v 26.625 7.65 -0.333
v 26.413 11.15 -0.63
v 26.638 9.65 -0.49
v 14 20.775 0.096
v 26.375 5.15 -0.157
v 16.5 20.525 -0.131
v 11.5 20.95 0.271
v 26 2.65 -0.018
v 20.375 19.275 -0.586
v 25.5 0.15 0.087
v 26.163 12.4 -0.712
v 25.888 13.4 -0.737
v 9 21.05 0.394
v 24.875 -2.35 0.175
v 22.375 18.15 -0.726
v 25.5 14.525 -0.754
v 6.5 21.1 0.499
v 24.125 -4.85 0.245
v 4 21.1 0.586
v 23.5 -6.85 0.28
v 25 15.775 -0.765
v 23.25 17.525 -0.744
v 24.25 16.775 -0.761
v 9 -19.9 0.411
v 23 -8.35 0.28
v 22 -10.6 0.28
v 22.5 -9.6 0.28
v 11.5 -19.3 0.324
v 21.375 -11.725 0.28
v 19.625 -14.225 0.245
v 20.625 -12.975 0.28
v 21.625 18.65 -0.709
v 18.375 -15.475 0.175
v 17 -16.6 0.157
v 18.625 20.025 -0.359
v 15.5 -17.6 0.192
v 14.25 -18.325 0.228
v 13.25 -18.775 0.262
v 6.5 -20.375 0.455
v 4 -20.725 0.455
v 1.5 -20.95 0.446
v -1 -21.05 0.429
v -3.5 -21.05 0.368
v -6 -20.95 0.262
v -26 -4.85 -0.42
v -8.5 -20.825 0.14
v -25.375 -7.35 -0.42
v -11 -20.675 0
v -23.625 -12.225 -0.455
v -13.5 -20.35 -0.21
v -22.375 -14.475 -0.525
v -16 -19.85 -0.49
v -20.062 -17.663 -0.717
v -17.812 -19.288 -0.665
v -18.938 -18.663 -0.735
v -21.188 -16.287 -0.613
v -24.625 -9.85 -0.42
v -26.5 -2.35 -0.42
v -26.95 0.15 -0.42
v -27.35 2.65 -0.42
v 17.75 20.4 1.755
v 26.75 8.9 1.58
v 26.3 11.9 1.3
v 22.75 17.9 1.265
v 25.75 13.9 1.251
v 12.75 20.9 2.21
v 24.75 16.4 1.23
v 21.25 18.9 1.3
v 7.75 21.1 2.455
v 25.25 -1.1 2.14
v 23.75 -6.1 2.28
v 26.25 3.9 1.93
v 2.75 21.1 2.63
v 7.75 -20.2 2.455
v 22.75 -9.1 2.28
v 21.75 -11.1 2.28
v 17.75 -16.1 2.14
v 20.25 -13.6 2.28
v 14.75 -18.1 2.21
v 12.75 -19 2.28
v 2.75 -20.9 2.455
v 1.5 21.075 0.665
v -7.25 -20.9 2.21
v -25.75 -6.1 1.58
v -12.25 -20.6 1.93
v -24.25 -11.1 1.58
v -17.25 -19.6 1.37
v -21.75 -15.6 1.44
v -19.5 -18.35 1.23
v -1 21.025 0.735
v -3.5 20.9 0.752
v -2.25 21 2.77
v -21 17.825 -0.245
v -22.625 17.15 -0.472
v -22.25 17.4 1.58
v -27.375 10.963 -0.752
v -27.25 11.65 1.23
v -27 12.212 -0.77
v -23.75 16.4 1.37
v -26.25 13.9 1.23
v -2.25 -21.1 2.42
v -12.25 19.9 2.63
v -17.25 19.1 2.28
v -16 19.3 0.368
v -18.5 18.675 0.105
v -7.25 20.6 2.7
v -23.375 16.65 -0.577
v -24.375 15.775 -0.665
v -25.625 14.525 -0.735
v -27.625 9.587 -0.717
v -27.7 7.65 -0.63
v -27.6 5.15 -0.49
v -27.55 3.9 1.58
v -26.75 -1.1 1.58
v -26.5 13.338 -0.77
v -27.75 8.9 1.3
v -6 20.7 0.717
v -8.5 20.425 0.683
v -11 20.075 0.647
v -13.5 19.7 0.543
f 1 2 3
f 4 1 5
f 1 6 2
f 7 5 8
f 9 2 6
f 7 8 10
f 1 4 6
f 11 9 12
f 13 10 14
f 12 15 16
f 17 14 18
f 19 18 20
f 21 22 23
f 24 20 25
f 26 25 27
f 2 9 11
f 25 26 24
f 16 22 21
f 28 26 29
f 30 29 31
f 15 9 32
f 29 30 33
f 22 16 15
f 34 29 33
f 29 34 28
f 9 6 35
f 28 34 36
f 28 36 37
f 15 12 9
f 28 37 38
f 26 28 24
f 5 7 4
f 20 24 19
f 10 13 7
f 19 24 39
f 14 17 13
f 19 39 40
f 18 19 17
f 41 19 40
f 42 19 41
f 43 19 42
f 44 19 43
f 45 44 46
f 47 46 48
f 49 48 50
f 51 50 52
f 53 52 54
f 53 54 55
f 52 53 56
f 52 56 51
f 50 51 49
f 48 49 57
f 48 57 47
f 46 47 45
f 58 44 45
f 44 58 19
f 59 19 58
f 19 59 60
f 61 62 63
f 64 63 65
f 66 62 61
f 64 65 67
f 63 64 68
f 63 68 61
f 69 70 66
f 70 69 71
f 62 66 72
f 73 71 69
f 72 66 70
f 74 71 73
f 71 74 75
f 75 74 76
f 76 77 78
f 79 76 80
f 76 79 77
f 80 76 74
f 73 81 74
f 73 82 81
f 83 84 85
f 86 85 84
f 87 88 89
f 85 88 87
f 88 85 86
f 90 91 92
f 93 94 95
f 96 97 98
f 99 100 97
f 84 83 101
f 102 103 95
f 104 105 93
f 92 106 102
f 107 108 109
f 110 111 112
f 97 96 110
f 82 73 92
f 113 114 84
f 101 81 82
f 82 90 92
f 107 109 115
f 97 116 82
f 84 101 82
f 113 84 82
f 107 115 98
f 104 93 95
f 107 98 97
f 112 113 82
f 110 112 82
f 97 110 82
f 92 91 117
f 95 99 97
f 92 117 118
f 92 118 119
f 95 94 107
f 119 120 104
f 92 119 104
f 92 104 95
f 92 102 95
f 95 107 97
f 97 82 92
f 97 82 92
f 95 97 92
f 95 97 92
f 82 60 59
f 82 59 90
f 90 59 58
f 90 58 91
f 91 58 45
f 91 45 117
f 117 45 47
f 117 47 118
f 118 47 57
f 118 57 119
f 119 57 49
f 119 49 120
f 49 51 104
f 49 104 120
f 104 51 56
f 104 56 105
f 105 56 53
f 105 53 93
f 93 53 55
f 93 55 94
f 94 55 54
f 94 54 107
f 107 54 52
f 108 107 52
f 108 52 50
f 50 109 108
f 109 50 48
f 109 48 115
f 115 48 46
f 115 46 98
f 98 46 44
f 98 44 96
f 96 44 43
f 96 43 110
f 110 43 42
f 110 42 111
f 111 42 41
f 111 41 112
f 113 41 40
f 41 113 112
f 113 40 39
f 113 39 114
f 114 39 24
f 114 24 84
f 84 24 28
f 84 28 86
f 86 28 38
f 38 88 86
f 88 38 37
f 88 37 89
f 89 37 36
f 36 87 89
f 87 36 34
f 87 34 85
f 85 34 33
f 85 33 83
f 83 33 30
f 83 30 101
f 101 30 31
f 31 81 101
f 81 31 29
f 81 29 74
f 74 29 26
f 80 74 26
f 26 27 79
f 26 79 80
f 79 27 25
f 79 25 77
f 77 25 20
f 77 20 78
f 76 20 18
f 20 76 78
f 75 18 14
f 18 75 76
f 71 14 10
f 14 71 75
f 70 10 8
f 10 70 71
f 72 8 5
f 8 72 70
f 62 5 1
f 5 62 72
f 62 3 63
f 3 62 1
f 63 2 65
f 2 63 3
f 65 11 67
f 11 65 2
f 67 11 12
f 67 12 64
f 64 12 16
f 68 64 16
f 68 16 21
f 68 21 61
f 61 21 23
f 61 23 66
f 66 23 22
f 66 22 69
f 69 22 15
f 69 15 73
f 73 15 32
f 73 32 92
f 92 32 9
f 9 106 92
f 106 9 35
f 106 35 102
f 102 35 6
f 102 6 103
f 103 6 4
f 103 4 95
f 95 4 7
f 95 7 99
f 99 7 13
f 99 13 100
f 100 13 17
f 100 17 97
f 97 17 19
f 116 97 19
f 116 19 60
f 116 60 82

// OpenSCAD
$fs=2.100000;
polyhedron(points=[
        [-27.350000, 2.650002, -0.420000],
        [-26.950000, 0.149998, -0.420000],
        [-26.500000, -2.349998, -0.420000],
        [-26.000000, -4.850002, -0.420000],
        [-25.375001, -7.349998, -0.420000],
        [-24.624999, -9.850002, -0.420000],
        [-23.625001, -12.224998, -0.455000],
        [-22.374999, -14.475002, -0.525000],
        [-21.187501, -16.287499, -0.612500],
        [-20.062499, -17.662501, -0.717500],
        [-18.937501, -18.662500, -0.735000],
        [-17.812499, -19.287500, -0.665000],
        [-16.000002, -19.850000, -0.490000],
        [-13.499998, -20.350000, -0.210000],
        [-11.000002, -20.675000, -0.000000],
        [-8.499998, -20.825000, 0.140000],
        [-6.000002, -20.950000, 0.262500],
        [-3.499998, -21.050000, 0.367500],
        [-1.000002, -21.050000, 0.428750],
        [1.500002, -20.950000, 0.446250],
        [3.999998, -20.725000, 0.455000],
        [6.500002, -20.375000, 0.455000],
        [8.999998, -19.900000, 0.411250],
        [11.500002, -19.300000, 0.323750],
        [13.249999, -18.775000, 0.262500],
        [14.250001, -18.325000, 0.227500],
        [15.499999, -17.600001, 0.192500],
        [17.000001, -16.599999, 0.157500],
        [18.374999, -15.475001, 0.175000],
        [19.625001, -14.224999, 0.245000],
        [20.624999, -12.975001, 0.280000],
        [21.375001, -11.724999, 0.280000],
        [22.000000, -10.600001, 0.280000],
        [22.500000, -9.599999, 0.280000],
        [23.000000, -8.350001, 0.280000],
        [23.500000, -6.849999, 0.280000],
        [24.124999, -4.850002, 0.245000],
        [24.875001, -2.349998, 0.175000],
        [25.500000, 0.149998, 0.087500],
        [26.000000, 2.650002, -0.017500],
        [26.375000, 5.149998, -0.157500],
        [26.625000, 7.650002, -0.332500],
        [26.637500, 9.649999, -0.490000],
        [26.412500, 11.150001, -0.630000],
        [26.162500, 12.399999, -0.712250],
        [25.887500, 13.400001, -0.736750],
        [25.500000, 14.524999, -0.754250],
        [25.000000, 15.775001, -0.764750],
        [24.250001, 16.774999, -0.761250],
        [23.249999, 17.525001, -0.743750],
        [22.375001, 18.150000, -0.726250],
        [21.624999, 18.650000, -0.708750],
        [20.375001, 19.274999, -0.586250],
        [18.624999, 20.025001, -0.358750],
        [16.500002, 20.525000, -0.131250],
        [13.999998, 20.775000, 0.096250],
        [11.500002, 20.950000, 0.271250],
        [8.999998, 21.050000, 0.393750],
        [6.500002, 21.100000, 0.498750],
        [3.999998, 21.100000, 0.586250],
        [1.500002, 21.075000, 0.665000],
        [-1.000002, 21.025000, 0.735000],
        [-3.499998, 20.900000, 0.752500],
        [-6.000002, 20.700000, 0.717500],
        [-8.499998, 20.425000, 0.682500],
        [-11.000002, 20.075000, 0.647500],
        [-13.499998, 19.700000, 0.542500],
        [-16.000002, 19.300000, 0.367500],
        [-18.499998, 18.675001, 0.105000],
        [-21.000002, 17.824999, -0.245000],
        [-22.624999, 17.150000, -0.472500],
        [-23.375001, 16.650000, -0.577500],
        [-24.374999, 15.775001, -0.665000],
        [-25.625001, 14.524999, -0.735000],
        [-26.500000, 13.337501, -0.770000],
        [-27.000000, 12.212499, -0.770000],
        [-27.375000, 10.962501, -0.752500],
        [-27.625000, 9.587499, -0.717500],
        [-27.700000, 7.650002, -0.630000],
        [-27.600000, 5.149998, -0.490000],
        [-27.550000, 3.900000, 1.580000],
        [-26.750000, -1.100000, 1.580000],
        [-25.750000, -6.100000, 1.580000],
        [-24.250000, -11.100000, 1.580000],
        [-21.750000, -15.600000, 1.440000],
        [-19.500000, -18.350000, 1.230000],
        [-17.250000, -19.600000, 1.370000],
        [-12.250000, -20.600000, 1.930000],
        [-7.250000, -20.900000, 2.210000],
        [-2.250000, -21.100000, 2.420000],
        [2.750000, -20.900000, 2.455000],
        [7.750000, -20.200000, 2.455000],
        [12.750000, -19.000000, 2.280000],
        [14.750000, -18.100000, 2.210000],
        [17.750000, -16.100000, 2.140000],
        [20.250000, -13.600000, 2.280000],
        [21.750000, -11.100000, 2.280000],
        [22.750000, -9.100000, 2.280000],
        [23.750000, -6.100000, 2.280000],
        [25.250000, -1.100000, 2.140000],
        [26.250000, 3.900000, 1.930000],
        [26.750000, 8.900000, 1.580000],
        [26.300000, 11.900000, 1.300000],
        [25.750000, 13.900000, 1.251000],
        [24.750000, 16.400000, 1.230000],
        [22.750000, 17.900000, 1.265000],
        [21.250000, 18.900000, 1.300000],
        [17.750000, 20.400000, 1.755000],
        [12.750000, 20.900000, 2.210000],
        [7.750000, 21.100000, 2.455000],
        [2.750000, 21.100000, 2.630000],
        [-2.250000, 21.000000, 2.770000],
        [-7.250000, 20.600000, 2.700000],
        [-12.250000, 19.900000, 2.630000],
        [-17.250000, 19.100000, 2.280000],
        [-22.250000, 17.400000, 1.580000],
        [-23.750000, 16.400000, 1.370000],
        [-26.250000, 13.900000, 1.230000],
        [-27.250000, 11.650000, 1.230000],
        [-27.750000, 8.900000, 1.300000],], 
    faces=[
        [0,1,2,3,4,5,6,7,8,9,10,11,12,13,14,15,16,17,18,19,20,21,22,23,24,25,26,27,28,29,30,31,32,33,34,35,36,37,38,39,40,41,42,43,44,45,46,47,48,49,50,51,52,53,54,55,56,57,58,59],
        [119,118,117,116,115,114,113,112,111,110,109,108,107,106,105,104,103,102,101,100,99,98,97,96,95,94,93,92,91,90,89,88,87,86,85,84,83,82,81,80,79,78,77,76,75,74,73,72,71,70,69,68,67,66,65,64,63,62,61,60],
        [60,61,1,0],
        [61,62,2,1],
        [62,63,3,2],
        [63,64,4,3],
        [64,65,5,4],
        [65,66,6,5],
        [66,67,7,6],
        [67,68,8,7],
        [68,69,9,8],
        [69,70,10,9],
        [70,71,11,10],
        [71,72,12,11],
        [72,73,13,12],
        [73,74,14,13],
        [74,75,15,14],
        [75,76,16,15],
        [76,77,17,16],
        [77,78,18,17],
        [78,79,19,18],
        [79,80,20,19],
        [80,81,21,20],
        [81,82,22,21],
        [82,83,23,22],
        [83,84,24,23],
        [84,85,25,24],
        [85,86,26,25],
        [86,87,27,26],
        [87,88,28,27],
        [88,89,29,28],
        [89,90,30,29],
        [90,91,31,30],
        [91,92,32,31],
        [92,93,33,32],
        [93,94,34,33],
        [94,95,35,34],
        [95,96,36,35],
        [96,97,37,36],
        [97,98,38,37],
        [98,99,39,38],
        [99,100,40,39],
        [100,101,41,40],
        [101,102,42,41],
        [102,103,43,42],
        [103,104,44,43],
        [104,105,45,44],
        [105,106,46,45],
        [106,107,47,46],
        [107,108,48,47],
        [108,109,49,48],
        [109,110,50,49],
        [110,111,51,50],
        [111,112,52,51],
        [112,113,53,52],
        [113,114,54,53],
        [114,115,55,54],
        [115,116,56,55],
        [116,117,57,56],
        [117,118,58,57],
        [118,119,59,58],
        [119,60,0,59]]);
